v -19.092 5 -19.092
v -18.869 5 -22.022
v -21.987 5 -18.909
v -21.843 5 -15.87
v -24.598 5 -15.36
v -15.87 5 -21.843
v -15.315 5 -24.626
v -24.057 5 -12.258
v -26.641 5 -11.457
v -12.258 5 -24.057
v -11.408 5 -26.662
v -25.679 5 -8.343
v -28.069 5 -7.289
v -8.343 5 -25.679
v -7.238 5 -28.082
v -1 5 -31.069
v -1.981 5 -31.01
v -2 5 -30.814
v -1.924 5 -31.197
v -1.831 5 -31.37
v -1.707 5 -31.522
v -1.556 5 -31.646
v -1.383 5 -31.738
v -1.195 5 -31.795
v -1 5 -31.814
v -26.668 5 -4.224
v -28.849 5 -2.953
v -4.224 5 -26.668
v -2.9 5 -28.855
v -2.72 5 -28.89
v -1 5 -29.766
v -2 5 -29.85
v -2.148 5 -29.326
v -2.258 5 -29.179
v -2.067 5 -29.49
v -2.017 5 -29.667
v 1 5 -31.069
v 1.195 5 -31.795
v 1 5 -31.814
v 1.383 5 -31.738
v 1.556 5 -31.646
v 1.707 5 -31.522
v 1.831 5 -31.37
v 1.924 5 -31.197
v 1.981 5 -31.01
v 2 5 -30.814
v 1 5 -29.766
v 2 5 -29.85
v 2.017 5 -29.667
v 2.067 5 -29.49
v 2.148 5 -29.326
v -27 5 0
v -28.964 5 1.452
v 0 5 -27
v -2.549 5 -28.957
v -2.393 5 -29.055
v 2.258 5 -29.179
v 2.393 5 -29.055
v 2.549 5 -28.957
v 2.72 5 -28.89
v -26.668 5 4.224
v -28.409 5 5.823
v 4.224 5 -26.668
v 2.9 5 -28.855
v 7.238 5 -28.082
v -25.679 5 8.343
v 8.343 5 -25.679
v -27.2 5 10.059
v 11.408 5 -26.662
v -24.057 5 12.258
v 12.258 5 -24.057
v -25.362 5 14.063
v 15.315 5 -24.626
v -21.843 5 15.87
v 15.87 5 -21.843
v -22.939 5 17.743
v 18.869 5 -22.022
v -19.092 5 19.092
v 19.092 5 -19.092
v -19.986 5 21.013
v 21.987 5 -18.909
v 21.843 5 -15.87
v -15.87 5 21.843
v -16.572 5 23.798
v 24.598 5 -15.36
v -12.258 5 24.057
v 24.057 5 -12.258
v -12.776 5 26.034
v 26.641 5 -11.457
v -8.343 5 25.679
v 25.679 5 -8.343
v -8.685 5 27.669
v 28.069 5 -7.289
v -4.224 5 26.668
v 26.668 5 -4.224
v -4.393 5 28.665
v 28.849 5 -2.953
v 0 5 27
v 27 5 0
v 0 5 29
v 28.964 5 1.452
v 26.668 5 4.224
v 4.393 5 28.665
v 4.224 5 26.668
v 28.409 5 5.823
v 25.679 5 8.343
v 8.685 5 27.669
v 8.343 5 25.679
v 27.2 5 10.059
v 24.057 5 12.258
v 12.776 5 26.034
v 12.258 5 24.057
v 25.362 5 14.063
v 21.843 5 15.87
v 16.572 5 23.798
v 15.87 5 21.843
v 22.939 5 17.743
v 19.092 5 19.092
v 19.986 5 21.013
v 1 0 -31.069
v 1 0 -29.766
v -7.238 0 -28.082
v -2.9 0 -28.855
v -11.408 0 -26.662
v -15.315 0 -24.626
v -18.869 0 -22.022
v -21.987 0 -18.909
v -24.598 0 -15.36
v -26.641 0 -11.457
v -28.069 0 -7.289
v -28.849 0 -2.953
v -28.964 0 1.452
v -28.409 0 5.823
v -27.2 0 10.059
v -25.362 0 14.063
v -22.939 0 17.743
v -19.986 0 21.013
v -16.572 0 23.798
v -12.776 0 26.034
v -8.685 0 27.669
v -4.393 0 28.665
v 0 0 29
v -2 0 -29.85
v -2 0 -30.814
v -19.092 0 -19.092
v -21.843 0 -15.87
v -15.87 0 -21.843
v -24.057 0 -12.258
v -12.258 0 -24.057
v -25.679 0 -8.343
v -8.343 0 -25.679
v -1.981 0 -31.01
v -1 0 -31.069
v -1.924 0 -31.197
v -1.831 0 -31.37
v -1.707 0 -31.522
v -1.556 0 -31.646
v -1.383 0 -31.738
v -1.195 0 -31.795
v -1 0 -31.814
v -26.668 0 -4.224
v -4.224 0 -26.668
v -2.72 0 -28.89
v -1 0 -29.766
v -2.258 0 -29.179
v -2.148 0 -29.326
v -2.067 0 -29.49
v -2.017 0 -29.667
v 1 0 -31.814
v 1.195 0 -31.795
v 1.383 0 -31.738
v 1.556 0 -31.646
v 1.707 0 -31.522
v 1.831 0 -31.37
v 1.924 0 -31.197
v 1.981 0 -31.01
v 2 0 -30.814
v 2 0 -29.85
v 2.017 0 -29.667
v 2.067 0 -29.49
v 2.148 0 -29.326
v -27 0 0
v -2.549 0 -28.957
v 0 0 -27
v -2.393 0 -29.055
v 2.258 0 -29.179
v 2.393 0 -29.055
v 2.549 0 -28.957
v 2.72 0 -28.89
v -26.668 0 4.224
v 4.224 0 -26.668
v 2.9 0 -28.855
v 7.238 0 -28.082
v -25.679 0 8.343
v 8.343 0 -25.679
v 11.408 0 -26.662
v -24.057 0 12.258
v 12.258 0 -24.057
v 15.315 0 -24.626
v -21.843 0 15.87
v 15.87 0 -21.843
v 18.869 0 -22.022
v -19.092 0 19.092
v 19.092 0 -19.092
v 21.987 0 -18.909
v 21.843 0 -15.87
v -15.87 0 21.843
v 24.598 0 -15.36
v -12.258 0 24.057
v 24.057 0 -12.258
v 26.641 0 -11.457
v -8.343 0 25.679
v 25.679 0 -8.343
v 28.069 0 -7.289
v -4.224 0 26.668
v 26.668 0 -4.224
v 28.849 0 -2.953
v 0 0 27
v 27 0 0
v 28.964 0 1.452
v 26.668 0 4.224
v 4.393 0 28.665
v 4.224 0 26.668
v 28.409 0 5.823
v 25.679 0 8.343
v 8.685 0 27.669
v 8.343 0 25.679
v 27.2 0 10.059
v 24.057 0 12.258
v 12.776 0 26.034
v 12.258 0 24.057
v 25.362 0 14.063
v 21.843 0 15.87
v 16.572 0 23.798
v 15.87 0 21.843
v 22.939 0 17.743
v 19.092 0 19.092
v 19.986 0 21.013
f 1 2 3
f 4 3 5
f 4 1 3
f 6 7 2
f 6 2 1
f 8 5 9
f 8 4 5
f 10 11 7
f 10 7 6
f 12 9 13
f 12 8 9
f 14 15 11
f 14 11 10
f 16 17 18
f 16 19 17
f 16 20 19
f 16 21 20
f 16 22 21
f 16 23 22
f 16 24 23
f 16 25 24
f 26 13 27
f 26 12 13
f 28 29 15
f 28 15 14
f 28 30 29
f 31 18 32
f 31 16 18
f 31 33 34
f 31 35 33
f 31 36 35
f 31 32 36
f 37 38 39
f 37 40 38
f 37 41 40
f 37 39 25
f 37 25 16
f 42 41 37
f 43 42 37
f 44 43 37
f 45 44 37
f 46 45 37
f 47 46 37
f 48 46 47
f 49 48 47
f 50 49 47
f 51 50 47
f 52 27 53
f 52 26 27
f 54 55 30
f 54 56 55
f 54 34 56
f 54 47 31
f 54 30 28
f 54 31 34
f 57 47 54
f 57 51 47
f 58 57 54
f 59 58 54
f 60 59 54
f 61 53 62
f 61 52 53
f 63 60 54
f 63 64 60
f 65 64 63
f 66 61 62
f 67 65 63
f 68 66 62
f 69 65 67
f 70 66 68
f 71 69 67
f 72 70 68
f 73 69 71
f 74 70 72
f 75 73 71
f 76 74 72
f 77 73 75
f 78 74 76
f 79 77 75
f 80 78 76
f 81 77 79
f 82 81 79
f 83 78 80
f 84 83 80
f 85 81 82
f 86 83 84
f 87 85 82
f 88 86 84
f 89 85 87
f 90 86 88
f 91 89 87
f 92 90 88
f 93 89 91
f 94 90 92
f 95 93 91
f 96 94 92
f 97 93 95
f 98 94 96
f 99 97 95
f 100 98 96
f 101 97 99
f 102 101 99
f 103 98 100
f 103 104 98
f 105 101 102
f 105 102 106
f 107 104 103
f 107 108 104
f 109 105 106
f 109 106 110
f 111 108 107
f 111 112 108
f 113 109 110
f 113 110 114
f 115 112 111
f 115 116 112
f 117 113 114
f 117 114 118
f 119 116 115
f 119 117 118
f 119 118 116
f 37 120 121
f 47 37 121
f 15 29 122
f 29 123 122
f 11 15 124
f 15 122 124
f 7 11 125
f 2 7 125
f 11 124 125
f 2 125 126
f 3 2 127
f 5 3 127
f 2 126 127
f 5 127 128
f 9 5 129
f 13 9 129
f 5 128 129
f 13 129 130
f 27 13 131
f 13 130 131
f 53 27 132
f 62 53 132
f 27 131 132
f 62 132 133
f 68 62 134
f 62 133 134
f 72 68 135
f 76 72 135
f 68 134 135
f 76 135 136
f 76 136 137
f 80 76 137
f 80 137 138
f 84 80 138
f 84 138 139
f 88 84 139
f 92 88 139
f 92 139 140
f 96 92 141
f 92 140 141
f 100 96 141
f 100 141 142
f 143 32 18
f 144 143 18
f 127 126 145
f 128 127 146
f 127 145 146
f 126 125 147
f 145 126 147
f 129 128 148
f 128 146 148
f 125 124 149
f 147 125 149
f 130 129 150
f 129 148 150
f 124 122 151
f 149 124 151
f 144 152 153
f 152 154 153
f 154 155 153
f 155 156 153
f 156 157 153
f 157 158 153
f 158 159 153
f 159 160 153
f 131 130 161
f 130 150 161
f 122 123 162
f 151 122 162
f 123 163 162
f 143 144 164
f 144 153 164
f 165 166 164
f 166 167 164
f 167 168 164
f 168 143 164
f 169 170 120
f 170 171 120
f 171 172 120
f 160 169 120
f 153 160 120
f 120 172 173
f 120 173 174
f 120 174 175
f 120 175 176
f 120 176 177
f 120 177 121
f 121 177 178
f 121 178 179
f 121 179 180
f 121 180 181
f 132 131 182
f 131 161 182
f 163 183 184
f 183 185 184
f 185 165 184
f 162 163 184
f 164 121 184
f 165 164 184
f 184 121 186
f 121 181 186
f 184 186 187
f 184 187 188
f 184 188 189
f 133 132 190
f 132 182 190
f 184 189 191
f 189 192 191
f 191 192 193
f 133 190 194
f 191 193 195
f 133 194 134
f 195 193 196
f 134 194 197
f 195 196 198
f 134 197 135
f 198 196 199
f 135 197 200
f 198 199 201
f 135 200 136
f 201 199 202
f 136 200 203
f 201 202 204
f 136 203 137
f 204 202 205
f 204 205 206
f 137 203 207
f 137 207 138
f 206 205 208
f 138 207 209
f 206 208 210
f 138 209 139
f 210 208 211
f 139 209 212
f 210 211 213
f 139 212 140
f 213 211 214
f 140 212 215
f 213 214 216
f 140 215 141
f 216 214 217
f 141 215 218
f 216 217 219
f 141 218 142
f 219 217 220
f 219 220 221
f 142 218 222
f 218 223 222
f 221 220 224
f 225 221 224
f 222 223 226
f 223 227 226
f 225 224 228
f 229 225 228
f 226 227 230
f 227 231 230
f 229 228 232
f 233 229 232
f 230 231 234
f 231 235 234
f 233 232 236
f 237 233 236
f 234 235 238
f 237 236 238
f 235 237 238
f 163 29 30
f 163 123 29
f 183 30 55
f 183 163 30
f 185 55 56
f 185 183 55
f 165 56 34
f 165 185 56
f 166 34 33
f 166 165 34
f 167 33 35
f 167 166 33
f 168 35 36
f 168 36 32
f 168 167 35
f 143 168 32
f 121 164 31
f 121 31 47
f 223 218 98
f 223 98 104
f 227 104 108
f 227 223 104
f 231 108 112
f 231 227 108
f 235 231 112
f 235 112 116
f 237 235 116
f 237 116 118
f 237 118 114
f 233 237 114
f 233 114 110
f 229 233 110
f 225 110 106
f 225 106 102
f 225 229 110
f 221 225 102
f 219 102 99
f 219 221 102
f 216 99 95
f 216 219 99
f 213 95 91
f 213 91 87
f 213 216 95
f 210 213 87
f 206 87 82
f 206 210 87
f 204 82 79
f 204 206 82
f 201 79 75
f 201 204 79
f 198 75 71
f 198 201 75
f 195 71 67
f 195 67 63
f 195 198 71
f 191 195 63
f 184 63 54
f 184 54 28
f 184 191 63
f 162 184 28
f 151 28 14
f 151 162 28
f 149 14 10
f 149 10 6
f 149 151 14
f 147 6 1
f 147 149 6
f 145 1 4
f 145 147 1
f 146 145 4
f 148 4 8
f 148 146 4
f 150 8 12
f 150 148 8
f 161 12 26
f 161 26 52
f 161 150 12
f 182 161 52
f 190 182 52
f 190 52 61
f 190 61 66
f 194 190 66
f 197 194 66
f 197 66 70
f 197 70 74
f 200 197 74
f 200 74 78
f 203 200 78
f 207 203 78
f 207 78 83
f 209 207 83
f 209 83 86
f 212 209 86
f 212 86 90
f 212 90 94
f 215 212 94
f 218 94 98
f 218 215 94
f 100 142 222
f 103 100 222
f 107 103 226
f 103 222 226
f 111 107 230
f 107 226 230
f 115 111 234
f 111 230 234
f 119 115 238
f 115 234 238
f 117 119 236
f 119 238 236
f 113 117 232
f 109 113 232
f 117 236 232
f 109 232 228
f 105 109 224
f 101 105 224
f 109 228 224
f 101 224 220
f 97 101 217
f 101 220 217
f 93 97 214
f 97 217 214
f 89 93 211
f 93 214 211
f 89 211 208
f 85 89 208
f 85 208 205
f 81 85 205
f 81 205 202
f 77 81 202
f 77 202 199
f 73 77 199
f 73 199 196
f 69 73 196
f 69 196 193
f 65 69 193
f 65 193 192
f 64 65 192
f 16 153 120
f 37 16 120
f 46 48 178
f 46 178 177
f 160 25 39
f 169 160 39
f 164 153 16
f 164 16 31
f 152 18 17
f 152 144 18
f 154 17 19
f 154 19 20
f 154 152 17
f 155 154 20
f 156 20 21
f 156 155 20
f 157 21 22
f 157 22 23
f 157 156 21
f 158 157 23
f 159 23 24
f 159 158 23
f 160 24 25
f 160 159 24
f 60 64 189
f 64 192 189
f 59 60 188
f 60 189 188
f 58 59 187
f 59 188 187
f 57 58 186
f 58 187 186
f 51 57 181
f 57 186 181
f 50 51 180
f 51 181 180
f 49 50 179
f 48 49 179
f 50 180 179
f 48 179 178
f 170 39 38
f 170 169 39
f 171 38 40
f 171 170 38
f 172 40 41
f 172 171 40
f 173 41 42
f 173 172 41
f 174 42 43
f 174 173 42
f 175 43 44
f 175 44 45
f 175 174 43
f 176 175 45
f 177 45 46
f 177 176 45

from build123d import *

# Parameters (mm, degrees)
ESBO_O1_R                = 29
ESBO_O1_R_2              = 27
RESSALTO_EXTRUS_O1_DEPTH = 5
ESBO_O2_W                = 4
ESBO_O2_H                = 4
RESSALTO_EXTRUS_O2_DEPTH = 5
FILETE1_R                = 1
ESBO_O3_W                = 2
ESBO_O3_H                = 1.302391812
CORTE_EXTRUS_O1_DEPTH    = 44.337755413


with BuildPart() as part:
    # Esboço1 → Ressalto-extrusão1 (new body)
    with BuildSketch(Plane(origin=(0, 0, 0), x_dir=(1, 0, 0), z_dir=(0, 1, 0))):
        with Locations(Location((0, 0, 0), (0, 0, 270))):
            Circle(ESBO_O1_R)
        with Locations(Location((0, 0, 0), (0, 0, 270))):
            Circle(ESBO_O1_R_2, mode=Mode.SUBTRACT)
    extrude(amount=RESSALTO_EXTRUS_O1_DEPTH)

    # Esboço2 → Ressalto-extrusão2 (add, through all)
    with BuildSketch(Plane(origin=(0, 5, 0), x_dir=(1, 0, 0), z_dir=(0, 1, 0))):
        with Locations((0, 29.814478531)):
            Rectangle(ESBO_O2_W, ESBO_O2_H)
    extrude(amount=-RESSALTO_EXTRUS_O2_DEPTH)

    # Filete1
    filete1_edges = [part.edges().sort_by_distance(p)[0] for p in [
        (-2, 2.5, -28.930952283),
        (2, 2.5, -28.930952283),
        (2, 2.5, -31.814478531),
        (-2, 2.5, -31.814478531),
    ]]
    fillet(filete1_edges, radius=FILETE1_R)

    # Esboço3 → Corte-extrusão1 (cut, through all)
    with BuildSketch(Plane.XZ):
        with Locations((0, -30.417415502)):
            Rectangle(ESBO_O3_W, ESBO_O3_H)
    extrude(amount=-CORTE_EXTRUS_O1_DEPTH, mode=Mode.SUBTRACT)


solid = part.part
